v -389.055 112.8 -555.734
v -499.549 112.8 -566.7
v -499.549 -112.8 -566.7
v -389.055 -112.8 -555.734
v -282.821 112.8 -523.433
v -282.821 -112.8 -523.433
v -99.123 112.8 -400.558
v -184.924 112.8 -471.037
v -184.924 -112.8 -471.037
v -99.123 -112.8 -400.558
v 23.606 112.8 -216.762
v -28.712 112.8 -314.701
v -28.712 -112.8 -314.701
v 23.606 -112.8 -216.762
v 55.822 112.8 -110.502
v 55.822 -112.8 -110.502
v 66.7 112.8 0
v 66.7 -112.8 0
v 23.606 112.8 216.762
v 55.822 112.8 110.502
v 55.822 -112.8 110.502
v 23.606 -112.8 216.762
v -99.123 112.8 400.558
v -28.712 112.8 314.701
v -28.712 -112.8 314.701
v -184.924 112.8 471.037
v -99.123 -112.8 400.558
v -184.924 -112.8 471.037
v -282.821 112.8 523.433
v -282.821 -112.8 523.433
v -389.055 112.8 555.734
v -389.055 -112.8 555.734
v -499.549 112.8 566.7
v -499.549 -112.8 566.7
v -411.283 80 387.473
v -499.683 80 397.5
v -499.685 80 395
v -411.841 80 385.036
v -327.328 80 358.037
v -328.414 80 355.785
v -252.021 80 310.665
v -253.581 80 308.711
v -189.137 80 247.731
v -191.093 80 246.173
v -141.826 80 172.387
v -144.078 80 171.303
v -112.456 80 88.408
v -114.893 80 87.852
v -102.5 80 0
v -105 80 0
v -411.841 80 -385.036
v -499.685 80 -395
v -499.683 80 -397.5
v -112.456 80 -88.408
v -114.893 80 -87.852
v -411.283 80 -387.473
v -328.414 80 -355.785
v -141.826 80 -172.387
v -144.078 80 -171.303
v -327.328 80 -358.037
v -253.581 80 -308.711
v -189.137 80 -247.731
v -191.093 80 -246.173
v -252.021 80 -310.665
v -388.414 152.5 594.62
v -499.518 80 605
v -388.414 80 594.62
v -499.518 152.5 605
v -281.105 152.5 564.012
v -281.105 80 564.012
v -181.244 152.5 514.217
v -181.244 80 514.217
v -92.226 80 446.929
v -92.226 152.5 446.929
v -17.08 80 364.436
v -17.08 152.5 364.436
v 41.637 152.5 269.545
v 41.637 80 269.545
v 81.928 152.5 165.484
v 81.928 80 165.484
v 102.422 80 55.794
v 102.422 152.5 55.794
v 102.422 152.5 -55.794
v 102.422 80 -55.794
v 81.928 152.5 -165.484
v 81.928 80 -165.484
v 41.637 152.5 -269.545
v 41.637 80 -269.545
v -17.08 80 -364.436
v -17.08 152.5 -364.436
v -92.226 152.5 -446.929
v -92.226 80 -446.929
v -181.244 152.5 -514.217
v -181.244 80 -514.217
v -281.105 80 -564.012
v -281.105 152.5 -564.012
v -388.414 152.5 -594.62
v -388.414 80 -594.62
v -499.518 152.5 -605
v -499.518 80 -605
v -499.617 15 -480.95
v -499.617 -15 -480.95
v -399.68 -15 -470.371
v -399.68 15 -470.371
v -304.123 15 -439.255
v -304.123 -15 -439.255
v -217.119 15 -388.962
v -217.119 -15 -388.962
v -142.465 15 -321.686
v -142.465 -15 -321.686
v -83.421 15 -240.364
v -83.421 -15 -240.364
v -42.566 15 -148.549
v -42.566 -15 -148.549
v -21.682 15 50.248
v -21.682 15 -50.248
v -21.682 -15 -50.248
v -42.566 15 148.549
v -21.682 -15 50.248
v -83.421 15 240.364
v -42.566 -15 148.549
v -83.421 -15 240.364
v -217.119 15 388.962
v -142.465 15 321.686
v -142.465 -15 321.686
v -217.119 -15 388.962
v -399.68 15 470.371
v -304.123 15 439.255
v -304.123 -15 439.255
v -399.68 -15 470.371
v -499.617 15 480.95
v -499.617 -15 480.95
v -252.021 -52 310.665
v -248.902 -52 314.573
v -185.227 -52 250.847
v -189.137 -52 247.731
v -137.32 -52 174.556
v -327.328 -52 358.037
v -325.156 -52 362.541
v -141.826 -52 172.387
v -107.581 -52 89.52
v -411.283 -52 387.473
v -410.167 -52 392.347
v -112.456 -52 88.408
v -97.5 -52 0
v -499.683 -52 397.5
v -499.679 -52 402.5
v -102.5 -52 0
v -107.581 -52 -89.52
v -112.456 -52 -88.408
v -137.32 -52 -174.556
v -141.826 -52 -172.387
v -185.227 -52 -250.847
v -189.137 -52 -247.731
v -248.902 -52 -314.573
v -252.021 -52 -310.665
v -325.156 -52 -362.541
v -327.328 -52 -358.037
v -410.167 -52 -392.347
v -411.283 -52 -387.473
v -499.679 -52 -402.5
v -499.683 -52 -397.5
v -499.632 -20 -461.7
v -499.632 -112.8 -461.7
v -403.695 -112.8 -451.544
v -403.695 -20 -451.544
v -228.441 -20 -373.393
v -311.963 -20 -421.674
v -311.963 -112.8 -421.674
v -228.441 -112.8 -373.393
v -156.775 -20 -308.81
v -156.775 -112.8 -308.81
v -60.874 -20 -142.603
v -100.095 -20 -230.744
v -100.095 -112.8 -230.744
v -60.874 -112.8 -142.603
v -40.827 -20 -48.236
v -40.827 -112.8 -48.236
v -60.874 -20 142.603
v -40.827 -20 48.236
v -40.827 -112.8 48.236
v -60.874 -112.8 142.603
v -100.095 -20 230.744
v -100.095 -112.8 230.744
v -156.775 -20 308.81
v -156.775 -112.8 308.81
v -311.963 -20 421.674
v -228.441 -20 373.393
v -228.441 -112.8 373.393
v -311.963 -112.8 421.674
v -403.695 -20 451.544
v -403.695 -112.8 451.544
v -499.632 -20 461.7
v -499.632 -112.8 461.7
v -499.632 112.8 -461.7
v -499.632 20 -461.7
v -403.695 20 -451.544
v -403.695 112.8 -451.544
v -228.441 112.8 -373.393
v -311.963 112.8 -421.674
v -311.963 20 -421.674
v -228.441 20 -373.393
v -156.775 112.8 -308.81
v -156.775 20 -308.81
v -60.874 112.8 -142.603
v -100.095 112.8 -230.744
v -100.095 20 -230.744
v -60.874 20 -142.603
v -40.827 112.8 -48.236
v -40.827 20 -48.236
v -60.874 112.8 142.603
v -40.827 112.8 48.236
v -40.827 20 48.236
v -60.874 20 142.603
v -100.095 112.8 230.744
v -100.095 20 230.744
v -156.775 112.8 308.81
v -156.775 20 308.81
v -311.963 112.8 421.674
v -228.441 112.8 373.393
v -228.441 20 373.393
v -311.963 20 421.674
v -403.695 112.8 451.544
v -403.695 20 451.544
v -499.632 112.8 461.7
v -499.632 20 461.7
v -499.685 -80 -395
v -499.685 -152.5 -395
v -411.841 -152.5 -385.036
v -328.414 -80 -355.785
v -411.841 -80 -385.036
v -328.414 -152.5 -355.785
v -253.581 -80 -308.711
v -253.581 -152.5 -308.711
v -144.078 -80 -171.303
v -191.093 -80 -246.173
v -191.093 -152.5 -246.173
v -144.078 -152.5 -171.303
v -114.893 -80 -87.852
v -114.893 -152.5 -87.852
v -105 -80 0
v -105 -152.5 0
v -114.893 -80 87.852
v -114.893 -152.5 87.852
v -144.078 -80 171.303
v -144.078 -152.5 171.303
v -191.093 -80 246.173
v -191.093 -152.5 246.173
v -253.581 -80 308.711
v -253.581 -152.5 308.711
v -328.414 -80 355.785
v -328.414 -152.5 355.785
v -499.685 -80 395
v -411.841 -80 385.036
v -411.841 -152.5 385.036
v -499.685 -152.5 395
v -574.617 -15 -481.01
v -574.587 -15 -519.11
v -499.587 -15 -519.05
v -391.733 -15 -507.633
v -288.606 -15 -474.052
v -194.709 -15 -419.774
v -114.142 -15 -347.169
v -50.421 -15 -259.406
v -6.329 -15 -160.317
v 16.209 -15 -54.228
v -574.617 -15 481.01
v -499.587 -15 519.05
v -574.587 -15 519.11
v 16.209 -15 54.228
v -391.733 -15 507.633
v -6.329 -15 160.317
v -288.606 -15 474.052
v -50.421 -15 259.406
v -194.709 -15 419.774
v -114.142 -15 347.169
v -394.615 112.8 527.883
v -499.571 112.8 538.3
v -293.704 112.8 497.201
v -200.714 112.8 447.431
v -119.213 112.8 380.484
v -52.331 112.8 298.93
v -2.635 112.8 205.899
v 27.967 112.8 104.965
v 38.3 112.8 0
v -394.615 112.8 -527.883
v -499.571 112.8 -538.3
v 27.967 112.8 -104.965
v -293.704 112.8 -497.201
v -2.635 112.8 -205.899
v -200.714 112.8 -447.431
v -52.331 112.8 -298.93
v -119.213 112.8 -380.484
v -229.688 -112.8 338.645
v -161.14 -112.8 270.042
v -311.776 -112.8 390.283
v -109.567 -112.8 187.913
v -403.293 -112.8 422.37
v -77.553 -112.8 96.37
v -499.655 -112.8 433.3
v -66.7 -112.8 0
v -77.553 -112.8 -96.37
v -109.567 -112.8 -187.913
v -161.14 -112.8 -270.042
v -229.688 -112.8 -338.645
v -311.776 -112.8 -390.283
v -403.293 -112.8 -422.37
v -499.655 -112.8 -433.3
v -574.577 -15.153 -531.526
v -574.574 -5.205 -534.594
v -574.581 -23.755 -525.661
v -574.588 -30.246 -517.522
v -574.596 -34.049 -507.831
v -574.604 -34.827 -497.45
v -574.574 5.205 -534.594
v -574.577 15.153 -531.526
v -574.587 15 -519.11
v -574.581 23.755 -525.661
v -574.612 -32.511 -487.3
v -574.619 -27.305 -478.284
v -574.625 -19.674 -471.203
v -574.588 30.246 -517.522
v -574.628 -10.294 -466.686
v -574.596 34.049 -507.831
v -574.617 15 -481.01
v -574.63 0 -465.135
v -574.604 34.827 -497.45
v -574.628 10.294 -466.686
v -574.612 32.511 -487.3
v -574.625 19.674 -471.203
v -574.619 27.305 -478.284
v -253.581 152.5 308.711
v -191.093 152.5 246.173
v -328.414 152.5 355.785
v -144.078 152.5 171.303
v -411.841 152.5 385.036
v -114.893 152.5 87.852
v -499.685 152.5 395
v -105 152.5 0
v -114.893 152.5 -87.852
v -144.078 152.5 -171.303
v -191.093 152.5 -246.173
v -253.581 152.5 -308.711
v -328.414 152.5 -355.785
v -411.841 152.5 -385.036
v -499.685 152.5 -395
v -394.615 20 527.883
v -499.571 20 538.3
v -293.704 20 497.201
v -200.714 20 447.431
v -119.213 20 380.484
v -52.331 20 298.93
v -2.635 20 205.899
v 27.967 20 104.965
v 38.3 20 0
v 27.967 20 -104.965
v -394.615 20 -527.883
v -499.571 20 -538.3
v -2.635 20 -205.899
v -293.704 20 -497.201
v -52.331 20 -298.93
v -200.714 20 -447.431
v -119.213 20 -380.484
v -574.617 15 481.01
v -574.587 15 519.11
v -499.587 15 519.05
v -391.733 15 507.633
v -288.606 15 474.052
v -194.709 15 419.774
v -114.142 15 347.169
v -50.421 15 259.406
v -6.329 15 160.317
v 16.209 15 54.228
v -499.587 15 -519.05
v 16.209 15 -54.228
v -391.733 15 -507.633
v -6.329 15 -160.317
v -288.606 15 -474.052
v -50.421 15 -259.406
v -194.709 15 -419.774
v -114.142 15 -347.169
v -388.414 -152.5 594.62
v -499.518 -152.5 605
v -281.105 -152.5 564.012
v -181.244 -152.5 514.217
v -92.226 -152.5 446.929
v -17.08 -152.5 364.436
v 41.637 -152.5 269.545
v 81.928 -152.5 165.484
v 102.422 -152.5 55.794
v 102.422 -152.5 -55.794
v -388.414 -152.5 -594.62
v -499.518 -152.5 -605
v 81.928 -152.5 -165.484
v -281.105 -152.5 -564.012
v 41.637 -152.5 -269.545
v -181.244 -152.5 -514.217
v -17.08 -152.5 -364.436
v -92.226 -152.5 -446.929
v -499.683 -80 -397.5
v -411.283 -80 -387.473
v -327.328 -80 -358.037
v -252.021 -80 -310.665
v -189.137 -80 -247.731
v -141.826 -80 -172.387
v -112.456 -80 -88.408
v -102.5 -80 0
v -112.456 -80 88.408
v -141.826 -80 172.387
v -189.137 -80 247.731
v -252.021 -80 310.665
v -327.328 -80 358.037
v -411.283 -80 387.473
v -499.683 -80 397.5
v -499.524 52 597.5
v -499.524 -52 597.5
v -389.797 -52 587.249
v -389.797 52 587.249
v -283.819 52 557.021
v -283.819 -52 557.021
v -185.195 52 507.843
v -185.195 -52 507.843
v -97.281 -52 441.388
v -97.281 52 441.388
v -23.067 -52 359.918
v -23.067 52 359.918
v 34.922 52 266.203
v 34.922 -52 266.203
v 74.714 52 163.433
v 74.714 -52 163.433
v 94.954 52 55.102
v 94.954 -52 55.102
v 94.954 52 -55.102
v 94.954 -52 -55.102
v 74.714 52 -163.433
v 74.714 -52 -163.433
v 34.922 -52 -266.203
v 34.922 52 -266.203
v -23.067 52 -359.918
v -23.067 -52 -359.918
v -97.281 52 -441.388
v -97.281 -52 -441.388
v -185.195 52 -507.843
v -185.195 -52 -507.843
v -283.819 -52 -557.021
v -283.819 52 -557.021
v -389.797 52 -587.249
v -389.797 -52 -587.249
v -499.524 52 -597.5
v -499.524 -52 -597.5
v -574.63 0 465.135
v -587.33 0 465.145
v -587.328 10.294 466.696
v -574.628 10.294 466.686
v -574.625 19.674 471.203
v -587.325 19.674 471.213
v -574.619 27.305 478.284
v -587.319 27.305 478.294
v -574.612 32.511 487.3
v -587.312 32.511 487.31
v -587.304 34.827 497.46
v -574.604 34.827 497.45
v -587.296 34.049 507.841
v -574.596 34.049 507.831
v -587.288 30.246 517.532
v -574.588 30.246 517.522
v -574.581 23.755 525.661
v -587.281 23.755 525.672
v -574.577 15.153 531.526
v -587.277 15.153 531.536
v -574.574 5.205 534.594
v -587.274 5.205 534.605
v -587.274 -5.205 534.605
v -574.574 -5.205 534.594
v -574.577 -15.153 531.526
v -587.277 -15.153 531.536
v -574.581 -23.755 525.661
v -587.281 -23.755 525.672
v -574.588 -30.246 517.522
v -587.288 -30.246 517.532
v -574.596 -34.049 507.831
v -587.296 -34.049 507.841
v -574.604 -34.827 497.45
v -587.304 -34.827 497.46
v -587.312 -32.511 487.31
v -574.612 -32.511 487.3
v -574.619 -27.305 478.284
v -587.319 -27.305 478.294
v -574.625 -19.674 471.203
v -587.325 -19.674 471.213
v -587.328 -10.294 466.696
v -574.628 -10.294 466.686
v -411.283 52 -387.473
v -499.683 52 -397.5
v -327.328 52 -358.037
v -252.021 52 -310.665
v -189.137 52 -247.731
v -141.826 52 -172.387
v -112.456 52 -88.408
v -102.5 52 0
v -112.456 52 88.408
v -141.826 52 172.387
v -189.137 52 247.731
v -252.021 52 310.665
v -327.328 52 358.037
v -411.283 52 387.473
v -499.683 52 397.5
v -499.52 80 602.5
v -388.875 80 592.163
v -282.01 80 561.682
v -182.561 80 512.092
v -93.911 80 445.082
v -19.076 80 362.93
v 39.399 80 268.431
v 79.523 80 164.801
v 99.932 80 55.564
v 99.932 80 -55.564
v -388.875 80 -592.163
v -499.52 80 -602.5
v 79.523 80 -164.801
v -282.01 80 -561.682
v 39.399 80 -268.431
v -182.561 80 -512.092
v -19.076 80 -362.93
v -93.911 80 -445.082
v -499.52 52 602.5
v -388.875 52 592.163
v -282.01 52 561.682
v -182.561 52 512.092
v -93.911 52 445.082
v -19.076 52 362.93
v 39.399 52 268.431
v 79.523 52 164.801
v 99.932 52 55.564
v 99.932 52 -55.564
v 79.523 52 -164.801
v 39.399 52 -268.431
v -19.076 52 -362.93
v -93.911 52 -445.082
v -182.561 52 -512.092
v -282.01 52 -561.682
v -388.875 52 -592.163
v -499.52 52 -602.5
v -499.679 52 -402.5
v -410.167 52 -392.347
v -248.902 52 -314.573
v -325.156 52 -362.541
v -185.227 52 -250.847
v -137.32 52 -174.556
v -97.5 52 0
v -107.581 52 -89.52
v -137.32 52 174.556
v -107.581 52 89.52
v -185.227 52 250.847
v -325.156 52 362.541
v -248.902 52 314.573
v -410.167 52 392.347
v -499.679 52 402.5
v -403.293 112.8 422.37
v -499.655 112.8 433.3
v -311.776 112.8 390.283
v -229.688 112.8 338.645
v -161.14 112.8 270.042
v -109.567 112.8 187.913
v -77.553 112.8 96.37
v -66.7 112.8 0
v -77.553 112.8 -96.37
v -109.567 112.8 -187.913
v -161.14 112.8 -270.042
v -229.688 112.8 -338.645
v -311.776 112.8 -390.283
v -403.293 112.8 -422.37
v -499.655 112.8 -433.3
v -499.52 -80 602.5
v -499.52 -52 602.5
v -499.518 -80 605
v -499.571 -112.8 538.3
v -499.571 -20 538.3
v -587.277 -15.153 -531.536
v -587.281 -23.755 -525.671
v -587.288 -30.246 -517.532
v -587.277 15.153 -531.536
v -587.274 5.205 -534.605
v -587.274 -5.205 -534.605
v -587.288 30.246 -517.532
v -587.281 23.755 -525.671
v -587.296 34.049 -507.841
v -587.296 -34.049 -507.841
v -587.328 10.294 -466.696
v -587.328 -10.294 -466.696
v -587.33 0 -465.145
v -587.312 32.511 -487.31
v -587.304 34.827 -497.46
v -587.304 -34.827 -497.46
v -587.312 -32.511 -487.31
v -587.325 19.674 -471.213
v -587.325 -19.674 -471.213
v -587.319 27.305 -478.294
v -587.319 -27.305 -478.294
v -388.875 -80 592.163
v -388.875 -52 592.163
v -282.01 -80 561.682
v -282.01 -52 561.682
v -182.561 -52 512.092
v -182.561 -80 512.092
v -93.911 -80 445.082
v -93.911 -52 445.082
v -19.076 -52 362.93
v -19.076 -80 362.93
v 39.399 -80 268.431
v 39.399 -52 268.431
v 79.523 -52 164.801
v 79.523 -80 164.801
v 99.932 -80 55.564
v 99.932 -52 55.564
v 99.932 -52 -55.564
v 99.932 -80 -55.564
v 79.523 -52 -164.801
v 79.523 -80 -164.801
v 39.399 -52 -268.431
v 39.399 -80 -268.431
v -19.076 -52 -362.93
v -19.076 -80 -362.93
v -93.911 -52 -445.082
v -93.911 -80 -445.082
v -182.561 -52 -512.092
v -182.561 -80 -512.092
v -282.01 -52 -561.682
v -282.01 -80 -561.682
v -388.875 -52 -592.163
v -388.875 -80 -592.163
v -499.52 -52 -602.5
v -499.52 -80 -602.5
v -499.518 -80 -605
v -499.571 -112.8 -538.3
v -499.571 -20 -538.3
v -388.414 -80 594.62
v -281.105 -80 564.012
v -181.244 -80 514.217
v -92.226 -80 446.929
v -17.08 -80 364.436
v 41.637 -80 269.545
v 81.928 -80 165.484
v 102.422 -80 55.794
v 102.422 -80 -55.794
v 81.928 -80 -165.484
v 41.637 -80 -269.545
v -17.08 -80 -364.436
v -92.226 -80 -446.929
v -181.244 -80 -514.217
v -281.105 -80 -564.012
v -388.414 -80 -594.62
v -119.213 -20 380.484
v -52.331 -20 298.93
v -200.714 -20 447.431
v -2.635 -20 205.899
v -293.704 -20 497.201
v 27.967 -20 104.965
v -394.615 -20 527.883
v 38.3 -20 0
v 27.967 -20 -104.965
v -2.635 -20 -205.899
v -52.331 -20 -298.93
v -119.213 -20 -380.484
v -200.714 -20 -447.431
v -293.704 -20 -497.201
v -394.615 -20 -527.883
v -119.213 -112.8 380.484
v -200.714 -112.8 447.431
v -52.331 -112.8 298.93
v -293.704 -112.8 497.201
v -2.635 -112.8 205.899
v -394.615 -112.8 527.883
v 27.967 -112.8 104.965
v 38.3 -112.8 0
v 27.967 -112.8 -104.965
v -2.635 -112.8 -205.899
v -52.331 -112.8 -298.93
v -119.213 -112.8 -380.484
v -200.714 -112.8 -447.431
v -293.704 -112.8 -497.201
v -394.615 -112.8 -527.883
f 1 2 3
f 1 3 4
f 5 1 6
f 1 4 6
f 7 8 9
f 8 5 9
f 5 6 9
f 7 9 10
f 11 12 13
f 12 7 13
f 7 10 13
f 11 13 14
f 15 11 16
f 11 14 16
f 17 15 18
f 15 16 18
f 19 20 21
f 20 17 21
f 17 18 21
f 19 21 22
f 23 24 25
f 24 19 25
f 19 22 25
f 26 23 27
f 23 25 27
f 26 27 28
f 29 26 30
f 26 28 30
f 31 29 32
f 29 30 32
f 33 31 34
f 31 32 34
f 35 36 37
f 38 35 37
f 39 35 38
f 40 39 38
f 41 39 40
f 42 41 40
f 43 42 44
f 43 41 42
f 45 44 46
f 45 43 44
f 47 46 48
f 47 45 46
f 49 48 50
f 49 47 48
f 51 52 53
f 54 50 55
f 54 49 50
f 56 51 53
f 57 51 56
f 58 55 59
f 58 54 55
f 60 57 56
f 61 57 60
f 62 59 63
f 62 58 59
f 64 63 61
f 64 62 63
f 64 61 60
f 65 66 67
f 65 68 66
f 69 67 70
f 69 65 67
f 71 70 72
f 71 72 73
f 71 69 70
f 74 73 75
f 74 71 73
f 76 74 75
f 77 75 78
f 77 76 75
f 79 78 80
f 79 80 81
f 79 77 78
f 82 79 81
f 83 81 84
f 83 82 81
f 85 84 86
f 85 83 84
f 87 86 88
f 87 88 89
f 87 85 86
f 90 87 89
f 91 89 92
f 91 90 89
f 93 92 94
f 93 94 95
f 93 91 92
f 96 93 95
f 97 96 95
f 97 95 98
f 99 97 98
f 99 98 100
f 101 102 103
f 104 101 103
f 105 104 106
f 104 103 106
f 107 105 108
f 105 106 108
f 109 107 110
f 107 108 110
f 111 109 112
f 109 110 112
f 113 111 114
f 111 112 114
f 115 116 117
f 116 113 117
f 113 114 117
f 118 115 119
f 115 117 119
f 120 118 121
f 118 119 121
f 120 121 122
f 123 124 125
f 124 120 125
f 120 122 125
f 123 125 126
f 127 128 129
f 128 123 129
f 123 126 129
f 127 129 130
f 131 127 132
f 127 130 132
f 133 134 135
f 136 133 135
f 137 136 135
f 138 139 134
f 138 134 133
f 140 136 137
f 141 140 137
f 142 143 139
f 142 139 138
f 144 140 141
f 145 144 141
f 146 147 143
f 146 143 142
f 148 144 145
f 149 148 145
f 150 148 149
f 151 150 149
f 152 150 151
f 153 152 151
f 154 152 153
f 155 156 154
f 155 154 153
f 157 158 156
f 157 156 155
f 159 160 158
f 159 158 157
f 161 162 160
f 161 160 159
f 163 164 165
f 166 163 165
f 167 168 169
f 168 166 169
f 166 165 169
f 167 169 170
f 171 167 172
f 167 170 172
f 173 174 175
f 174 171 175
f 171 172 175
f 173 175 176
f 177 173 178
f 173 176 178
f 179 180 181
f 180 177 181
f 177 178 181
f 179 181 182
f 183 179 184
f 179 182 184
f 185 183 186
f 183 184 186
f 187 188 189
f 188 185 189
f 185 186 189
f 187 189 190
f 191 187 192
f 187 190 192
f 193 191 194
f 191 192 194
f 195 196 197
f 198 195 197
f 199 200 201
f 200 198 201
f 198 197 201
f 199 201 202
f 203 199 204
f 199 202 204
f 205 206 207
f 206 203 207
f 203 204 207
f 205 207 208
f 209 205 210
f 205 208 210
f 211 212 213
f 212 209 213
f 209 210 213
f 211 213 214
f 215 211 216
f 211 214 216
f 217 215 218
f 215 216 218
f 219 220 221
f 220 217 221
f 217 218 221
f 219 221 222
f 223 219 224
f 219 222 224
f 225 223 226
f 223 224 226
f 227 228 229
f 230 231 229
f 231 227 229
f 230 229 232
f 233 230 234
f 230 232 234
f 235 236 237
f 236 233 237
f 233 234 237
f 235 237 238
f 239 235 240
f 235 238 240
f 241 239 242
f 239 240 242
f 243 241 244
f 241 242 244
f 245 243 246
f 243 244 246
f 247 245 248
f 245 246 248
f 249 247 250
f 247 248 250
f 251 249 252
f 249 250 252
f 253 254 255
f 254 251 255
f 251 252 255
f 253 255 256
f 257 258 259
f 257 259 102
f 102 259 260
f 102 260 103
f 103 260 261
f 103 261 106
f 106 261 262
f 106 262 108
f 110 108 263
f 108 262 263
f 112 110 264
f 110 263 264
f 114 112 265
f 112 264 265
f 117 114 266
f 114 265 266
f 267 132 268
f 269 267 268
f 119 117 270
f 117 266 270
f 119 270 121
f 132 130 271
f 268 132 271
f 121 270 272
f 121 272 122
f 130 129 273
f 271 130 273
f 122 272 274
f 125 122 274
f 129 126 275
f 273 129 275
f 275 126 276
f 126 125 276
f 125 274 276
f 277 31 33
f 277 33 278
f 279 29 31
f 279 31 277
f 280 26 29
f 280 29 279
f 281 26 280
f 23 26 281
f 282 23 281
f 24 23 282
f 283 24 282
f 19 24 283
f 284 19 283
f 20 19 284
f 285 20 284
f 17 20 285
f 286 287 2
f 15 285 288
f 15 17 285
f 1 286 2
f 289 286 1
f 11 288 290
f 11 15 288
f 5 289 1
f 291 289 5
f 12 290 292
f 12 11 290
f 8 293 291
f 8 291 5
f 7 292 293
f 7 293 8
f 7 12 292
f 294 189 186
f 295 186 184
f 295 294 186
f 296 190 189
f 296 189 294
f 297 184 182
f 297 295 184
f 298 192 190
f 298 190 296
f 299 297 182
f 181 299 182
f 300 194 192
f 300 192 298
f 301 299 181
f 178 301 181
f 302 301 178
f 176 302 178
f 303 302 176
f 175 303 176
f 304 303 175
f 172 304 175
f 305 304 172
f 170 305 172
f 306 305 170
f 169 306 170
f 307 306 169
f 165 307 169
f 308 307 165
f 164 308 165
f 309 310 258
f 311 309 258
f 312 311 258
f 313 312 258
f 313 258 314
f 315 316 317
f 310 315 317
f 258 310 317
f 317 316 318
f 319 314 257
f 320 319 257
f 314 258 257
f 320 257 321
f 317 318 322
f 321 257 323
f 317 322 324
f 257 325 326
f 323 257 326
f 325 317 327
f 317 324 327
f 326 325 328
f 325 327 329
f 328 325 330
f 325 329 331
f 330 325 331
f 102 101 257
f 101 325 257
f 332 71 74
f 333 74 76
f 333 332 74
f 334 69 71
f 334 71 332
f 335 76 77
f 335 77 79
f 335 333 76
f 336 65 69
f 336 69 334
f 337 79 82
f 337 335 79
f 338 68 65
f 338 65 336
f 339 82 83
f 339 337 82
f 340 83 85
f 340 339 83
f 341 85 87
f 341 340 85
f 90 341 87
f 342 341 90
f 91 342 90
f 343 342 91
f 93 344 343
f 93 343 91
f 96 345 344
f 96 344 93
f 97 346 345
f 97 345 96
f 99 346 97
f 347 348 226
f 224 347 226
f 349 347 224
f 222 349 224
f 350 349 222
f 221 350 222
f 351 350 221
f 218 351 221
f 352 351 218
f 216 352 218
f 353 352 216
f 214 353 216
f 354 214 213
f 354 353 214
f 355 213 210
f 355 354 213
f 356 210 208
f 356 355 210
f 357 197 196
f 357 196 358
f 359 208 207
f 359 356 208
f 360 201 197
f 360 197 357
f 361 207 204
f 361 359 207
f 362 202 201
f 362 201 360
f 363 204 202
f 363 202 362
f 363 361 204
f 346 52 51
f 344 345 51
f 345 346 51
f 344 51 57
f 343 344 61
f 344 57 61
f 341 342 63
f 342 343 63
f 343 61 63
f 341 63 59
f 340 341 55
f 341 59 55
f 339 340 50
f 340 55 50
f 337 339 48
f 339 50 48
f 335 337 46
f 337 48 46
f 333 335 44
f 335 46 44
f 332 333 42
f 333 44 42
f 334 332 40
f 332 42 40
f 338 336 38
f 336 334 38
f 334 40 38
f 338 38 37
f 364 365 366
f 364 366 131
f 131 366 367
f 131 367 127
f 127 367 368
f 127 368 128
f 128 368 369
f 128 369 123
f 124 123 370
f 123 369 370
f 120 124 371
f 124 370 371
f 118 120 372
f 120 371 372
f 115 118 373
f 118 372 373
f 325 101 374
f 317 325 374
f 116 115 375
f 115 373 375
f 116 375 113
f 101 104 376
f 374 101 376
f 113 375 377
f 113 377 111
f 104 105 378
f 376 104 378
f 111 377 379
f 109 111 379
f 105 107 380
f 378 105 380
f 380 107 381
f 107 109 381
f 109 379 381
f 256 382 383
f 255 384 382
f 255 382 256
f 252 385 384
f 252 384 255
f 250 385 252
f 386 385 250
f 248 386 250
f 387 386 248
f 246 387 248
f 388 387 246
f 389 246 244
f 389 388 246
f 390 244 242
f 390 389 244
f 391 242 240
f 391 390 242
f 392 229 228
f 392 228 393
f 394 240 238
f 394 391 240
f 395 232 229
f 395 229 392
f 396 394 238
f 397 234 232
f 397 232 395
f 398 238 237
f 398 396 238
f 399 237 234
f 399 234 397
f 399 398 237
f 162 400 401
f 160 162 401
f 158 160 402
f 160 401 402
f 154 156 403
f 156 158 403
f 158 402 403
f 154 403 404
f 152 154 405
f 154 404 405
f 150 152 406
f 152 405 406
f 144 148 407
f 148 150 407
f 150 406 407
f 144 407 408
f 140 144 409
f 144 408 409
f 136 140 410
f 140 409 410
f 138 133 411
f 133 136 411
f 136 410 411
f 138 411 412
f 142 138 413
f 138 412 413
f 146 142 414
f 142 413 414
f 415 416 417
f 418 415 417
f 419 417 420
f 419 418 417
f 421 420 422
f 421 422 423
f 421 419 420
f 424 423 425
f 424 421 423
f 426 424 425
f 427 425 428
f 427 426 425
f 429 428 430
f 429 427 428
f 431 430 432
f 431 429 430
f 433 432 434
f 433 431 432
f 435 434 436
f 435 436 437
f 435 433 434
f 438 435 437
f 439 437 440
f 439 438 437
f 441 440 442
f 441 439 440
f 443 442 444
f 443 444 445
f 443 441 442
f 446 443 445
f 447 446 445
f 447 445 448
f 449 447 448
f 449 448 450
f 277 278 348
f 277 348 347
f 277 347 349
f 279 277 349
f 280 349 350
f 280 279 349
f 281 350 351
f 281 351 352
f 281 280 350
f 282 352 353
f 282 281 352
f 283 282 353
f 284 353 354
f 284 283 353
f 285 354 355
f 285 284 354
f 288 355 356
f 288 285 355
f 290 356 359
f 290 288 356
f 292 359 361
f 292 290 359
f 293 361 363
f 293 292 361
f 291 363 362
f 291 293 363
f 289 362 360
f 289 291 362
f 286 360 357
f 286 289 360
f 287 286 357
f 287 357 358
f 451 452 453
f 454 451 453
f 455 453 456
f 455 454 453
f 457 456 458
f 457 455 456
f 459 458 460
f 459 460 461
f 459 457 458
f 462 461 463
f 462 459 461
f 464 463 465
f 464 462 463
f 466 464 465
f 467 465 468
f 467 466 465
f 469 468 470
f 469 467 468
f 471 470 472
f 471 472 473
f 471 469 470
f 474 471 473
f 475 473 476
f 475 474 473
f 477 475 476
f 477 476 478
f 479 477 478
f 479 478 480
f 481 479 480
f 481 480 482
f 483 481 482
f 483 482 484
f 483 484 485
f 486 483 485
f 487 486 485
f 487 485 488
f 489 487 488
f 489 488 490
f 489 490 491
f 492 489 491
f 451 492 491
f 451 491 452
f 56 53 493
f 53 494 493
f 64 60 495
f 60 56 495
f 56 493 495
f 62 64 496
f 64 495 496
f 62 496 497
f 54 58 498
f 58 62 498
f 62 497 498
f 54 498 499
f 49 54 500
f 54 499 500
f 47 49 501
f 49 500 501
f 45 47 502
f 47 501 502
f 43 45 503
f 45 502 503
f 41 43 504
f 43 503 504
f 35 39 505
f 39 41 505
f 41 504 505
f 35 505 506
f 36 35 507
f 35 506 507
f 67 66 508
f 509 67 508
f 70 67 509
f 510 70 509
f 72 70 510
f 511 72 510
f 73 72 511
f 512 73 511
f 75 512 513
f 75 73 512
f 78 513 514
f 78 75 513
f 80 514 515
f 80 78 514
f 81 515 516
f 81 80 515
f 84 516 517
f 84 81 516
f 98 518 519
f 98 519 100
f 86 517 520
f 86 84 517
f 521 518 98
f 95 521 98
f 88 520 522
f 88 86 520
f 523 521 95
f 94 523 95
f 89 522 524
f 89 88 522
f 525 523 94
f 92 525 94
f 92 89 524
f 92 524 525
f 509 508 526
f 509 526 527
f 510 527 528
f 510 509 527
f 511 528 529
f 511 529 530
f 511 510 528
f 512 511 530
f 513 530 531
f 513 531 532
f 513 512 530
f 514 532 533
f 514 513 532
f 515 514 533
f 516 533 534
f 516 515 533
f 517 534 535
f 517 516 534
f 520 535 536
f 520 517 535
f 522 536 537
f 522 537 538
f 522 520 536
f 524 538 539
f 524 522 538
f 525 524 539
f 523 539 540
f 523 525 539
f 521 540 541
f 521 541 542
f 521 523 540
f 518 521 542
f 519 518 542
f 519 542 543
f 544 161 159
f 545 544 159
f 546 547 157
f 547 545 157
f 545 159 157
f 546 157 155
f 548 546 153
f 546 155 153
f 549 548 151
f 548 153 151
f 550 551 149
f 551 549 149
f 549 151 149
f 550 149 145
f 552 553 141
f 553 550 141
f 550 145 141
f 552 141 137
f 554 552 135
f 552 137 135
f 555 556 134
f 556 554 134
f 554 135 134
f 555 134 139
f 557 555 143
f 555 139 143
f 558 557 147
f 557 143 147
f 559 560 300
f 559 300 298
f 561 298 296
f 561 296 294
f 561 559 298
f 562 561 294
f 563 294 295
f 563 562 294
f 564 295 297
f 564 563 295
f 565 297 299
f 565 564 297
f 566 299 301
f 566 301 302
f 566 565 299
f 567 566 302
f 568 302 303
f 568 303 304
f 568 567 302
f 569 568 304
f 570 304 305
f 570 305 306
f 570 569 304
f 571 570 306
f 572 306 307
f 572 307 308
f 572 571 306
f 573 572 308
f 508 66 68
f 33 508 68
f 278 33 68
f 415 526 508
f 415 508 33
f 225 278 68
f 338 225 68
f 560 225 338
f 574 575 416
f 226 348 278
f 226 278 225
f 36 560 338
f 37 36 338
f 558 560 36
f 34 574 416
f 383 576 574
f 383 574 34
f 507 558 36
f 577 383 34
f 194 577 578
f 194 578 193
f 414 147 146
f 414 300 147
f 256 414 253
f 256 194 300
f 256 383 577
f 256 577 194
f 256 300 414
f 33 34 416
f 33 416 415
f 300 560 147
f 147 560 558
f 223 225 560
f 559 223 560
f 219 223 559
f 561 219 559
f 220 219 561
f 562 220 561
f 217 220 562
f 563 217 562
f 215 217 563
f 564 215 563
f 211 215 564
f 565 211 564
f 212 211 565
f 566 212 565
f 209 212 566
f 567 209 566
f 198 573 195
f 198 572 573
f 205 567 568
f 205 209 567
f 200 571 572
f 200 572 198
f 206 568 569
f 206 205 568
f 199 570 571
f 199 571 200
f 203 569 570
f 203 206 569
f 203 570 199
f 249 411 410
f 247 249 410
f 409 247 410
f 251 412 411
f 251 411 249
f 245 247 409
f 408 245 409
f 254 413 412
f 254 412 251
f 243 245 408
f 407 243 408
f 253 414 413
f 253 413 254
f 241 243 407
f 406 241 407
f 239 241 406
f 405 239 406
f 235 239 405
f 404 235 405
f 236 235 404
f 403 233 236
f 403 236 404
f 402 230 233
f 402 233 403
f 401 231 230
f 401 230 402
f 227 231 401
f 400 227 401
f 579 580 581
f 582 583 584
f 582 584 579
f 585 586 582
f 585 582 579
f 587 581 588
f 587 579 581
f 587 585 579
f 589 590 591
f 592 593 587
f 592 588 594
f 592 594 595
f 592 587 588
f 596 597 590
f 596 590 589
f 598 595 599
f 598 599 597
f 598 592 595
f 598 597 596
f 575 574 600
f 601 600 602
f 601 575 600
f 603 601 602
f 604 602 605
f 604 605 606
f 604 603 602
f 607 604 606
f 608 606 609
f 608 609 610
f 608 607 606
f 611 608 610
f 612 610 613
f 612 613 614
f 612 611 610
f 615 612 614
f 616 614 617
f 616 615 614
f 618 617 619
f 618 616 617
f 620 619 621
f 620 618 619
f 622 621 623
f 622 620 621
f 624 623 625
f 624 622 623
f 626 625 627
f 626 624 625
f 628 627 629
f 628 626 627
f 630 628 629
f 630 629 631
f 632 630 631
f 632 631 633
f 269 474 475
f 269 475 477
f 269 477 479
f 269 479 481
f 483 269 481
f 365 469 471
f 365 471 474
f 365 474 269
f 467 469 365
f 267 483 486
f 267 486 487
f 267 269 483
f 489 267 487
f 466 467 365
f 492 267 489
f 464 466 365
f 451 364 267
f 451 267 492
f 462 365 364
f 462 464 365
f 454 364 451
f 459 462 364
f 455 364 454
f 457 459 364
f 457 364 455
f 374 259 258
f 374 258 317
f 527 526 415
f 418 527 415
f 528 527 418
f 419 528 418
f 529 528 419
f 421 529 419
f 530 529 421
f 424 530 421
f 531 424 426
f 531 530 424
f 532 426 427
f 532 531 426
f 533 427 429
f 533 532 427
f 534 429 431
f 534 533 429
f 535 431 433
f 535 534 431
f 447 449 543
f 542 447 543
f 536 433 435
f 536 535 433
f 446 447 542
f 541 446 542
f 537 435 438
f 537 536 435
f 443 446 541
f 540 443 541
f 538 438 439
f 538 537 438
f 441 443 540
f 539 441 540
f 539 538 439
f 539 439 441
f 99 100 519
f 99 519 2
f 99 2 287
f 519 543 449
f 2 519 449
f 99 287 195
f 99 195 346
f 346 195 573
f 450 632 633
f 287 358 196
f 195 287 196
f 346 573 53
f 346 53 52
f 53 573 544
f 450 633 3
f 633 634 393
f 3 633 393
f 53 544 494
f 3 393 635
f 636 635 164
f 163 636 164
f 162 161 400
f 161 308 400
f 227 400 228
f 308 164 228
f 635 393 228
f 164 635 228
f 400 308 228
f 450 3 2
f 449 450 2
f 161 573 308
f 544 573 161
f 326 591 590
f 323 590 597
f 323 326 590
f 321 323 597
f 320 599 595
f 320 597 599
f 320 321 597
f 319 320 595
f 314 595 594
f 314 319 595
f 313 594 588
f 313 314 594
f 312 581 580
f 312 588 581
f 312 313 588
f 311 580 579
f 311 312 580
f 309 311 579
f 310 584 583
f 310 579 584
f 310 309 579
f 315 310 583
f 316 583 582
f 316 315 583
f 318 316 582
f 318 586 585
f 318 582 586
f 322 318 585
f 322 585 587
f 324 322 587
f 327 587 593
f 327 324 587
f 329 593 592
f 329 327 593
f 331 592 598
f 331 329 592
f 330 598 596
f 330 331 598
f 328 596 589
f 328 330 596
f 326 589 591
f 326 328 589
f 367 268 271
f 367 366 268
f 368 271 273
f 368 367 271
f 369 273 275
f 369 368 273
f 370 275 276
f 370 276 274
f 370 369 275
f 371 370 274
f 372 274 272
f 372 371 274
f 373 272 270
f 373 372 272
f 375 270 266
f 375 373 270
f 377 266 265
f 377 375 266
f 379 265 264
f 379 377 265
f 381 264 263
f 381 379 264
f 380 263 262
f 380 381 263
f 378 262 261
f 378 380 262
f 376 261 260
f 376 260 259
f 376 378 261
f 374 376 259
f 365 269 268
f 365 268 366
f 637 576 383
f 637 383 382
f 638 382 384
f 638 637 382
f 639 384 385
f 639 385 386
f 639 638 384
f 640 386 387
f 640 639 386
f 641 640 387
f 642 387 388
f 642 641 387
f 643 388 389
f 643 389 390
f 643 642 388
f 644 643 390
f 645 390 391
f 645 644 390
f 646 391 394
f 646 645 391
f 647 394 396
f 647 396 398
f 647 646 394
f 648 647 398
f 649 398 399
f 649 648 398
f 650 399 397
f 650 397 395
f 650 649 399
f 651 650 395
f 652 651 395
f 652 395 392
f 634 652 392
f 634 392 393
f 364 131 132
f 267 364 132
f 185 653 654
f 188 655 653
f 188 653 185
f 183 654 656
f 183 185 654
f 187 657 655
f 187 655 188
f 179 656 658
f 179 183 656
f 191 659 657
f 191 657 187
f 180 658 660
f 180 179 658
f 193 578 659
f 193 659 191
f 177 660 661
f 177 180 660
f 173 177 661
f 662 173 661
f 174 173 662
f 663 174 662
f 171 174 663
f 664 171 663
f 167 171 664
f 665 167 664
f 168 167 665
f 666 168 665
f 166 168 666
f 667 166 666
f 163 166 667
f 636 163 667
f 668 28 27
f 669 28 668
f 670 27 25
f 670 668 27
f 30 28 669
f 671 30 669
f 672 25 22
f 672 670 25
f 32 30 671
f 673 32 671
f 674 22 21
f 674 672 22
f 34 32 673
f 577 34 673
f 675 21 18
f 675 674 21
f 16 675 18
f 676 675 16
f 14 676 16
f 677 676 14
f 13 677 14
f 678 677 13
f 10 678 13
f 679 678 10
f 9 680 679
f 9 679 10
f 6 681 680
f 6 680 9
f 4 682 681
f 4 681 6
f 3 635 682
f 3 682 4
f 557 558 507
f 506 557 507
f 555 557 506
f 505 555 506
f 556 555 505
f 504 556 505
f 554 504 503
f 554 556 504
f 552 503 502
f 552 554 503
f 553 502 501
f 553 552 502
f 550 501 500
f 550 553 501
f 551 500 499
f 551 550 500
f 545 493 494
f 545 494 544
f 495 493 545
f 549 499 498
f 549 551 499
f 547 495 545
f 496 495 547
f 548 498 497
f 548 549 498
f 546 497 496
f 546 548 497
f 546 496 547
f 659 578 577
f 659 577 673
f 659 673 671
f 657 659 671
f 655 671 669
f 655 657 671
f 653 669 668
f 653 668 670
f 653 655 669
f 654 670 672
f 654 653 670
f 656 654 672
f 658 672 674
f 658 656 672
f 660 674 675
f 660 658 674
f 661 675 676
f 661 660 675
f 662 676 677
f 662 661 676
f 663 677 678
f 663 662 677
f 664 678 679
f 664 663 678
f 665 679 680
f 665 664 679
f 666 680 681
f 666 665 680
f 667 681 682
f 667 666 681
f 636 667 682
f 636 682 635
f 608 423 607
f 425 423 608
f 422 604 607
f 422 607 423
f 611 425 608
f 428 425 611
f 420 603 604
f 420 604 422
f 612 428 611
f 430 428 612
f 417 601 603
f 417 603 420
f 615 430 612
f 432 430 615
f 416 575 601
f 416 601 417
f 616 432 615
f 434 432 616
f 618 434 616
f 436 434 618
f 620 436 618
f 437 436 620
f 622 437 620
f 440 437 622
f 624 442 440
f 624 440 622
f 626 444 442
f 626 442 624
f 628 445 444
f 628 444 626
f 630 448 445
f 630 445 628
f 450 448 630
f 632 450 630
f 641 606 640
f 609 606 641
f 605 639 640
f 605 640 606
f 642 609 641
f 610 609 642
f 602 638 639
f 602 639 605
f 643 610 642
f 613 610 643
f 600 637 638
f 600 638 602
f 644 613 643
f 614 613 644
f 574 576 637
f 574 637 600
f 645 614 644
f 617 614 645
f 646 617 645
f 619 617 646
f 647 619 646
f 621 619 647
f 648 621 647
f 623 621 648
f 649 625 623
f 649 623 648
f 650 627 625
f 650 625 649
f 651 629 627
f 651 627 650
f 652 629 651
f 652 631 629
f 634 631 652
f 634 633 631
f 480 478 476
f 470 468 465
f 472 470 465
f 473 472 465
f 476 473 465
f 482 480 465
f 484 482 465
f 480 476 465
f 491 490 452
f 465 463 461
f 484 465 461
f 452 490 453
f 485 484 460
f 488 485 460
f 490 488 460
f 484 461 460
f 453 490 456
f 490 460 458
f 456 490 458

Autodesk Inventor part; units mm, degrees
ref_plane "YZ Plane" through (0, 0, 0) normal (1, 0, 0) x (0, 1, 0)
ref_plane "XY Plane" through (0, 0, 0) normal (0, 0, 1) x (1, 0, 0)
sketch "Sketch1" plane through (0, 0, 0) normal (0, 0, 1) x (0, 1, 0)
  line L0 (-152.5, -105) -> (152.5, -105)
  line L1 (152.5, -105) -> (152.5, 105)
  line L2 (152.5, 105) -> (-152.5, 105)
  line L3 (-152.5, 105) -> (-152.5, -105)
  line L4 (-152.5, -105) -> (152.5, 105) construction
  line L5 (152.5, -105) -> (-152.5, 105) construction
  line L6 (112.8, 66.7) -> (-112.8, 66.7)
  line L7 (-112.8, 66.7) -> (-112.8, 38.3)
  line L8 (-112.8, 38.3) -> (-20, 38.3)
  line L9 (-20, 38.3) -> (-20, -38.3)
  line L10 (-20, -38.3) -> (-112.8, -38.3)
  line L11 (-112.8, -38.3) -> (-112.8, -66.7)
  line L12 (-112.8, -66.7) -> (112.8, -66.7)
  line L13 (112.8, -66.7) -> (112.8, -38.3)
  line L14 (112.8, -38.3) -> (20, -38.3)
  line L15 (20, -38.3) -> (20, 38.3)
  line L16 (20, 38.3) -> (112.8, 38.3)
  line L17 (112.8, 38.3) -> (112.8, 66.7)
  line L18 (-80, 105) -> (80, 105)
  line L19 (80, 105) -> (80, 102.5)
  line L20 (80, 102.5) -> (-80, 102.5)
  line L21 (-80, 102.5) -> (-80, 105)
  line L22 (-52, 102.5) -> (52, 102.5)
  line L23 (52, 102.5) -> (52, 97.5)
  line L24 (52, 97.5) -> (-52, 97.5)
  line L25 (-52, 97.5) -> (-52, 102.5)
  line L26 (-80, -102.5) -> (80, -102.5)
  line L27 (80, -102.5) -> (80, -105)
  line L28 (80, -105) -> (-80, -105)
  line L29 (-80, -105) -> (-80, -102.5)
  line L30 (-52, -97.5) -> (52, -97.5)
  line L31 (52, -97.5) -> (52, -102.5)
  line L32 (52, -102.5) -> (-52, -102.5)
  line L33 (-52, -102.5) -> (-52, -97.5)
  point P0 (0, 0)
  point P1 (20, 0)
  point P2 (-20, 0)
  point P3 (0, 0)
  point P4 (0, 66.7)
  point P5 (0, 0)
  point P6 (0, -66.7)
  point P7 (0, 102.5)
  point P8 (0, 105)
  point P9 (0, -102.5)
  point P10 (0, -105)
  dimension "d6" = 305
  dimension "d7" = 210
  dimension "d8" = 225.6
  dimension "d9" = 28.4
  dimension "d10" = 40
  dimension "d11" = 76.6
  dimension "d12" = 38.3
  dimension "d46" = 2.5
  dimension "d47" = 5
  dimension "d48" = 104
  dimension "d49" = 160
sketch "Sketch2" plane through (0, 0, 0) normal (0, 1, 0) x (-1, 0, 0)
  line L0 (0, -700) -> (0, 700) projected
  arc A0 (499.6018, 499.9998) -> (499.6018, -499.9998) centre (500, 0) ccw
  line L1 (500, 0) -> (0, 0) construction
  line L2 (499.6018, 499.9998) -> (500, 0) construction
  line L3 (499.6018, -499.9998) -> (500, 0) construction
  dimension "d54" = 90
  dimension "d58" = 1570
  dimension "d59" = 179.909
sweep "Sweep1" add profiles "Sketch1" path "Sketch2" path curves A0 contours L3 L2 L21 L20 L25 L24 L23 L19 L1 L0 L27 L26 L31 L30 L33 L29
sketch "Sketch3" plane through (0, 0, 0) normal (0, 0, 1) x (0, 1, 0)
  line L0 (20, 38.3) -> (112.8, 38.3) projected
  line L1 (112.8, 38.3) -> (112.8, 66.7) projected
  line L2 (112.8, 66.7) -> (-112.8, 66.7) projected
  line L3 (-112.8, 66.7) -> (-112.8, 38.3) projected
  line L4 (-112.8, 38.3) -> (-20, 38.3) projected
  line L5 (-20, 38.3) -> (-20, -38.3) projected
  line L6 (-20, -38.3) -> (-112.8, -38.3) projected
  line L7 (-112.8, -38.3) -> (-112.8, -66.7) projected
  line L8 (-112.8, -66.7) -> (112.8, -66.7) projected
  line L9 (112.8, -66.7) -> (112.8, -38.3) projected
  line L10 (112.8, -38.3) -> (20, -38.3) projected
  line L11 (20, -38.3) -> (20, 38.3) projected
  line L12 (80, 102.5) -> (80, 105) projected
  line L13 (80, 105) -> (152.5, 105) projected
  line L14 (152.5, 105) -> (152.5, -105) projected
  line L15 (152.5, -105) -> (80, -105) projected
  line L16 (80, -105) -> (80, -102.5) projected
  line L17 (80, -102.5) -> (52, -102.5) projected
  line L18 (52, -102.5) -> (52, -97.5) projected
  line L19 (52, -97.5) -> (-52, -97.5) projected
  line L20 (-52, -97.5) -> (-52, -102.5) projected
  line L21 (-52, -102.5) -> (-80, -102.5) projected
  line L22 (-80, -102.5) -> (-80, -105) projected
  line L23 (-80, -105) -> (-152.5, -105) projected
  line L24 (-152.5, -105) -> (-152.5, 105) projected
  line L25 (-152.5, 105) -> (-80, 105) projected
  line L26 (-80, 105) -> (-80, 102.5) projected
  line L27 (-80, 102.5) -> (-52, 102.5) projected
  line L28 (-52, 102.5) -> (-52, 97.5) projected
  line L29 (-52, 97.5) -> (52, 97.5) projected
  line L30 (52, 97.5) -> (52, 102.5) projected
  line L31 (52, 102.5) -> (80, 102.5) projected
  line L32 (23.9, 65.45) -> (108.9, 65.45)
  line L33 (108.9, 65.45) -> (108.9, 39.55)
  line L34 (108.9, 39.55) -> (23.9, 39.55)
  line L35 (23.9, 39.55) -> (23.9, 65.45)
  line L36 (23.9, 65.45) -> (108.9, 39.55) construction
  line L37 (108.9, 65.45) -> (23.9, 39.55) construction
  line L38 (0, 226) -> (0, -621) projected
  line L39 (-23.9, 65.45) -> (-108.9, 65.45)
  line L40 (-108.9, 65.45) -> (-108.9, 39.55)
  line L41 (-108.9, 39.55) -> (-23.9, 39.55)
  line L42 (-23.9, 39.55) -> (-23.9, 65.45)
  point P0 (112.8, -500)
  point P1 (66.4, 52.5)
  point P2 (66.4, 52.5)
  point P3 (66.4, 38.3)
  point P4 (108.9, 52.5)
  point P5 (112.8, 52.5)
  dimension "d60" = 85
  dimension "d61" = 25.9
ref_plane "Work Plane2" through (-52.5, 66.4, 0) normal (0, 1, 0) x (-1, 0, 0)
sketch "Sketch10" plane through (-52.5, 66.4, 0) normal (0, 1, 0) x (-1, 0, 0)
  arc A0 (447.155, 433.2999) -> (447.155, -433.2999) centre (447.5, 0) ccw projected
  arc A1 (447.0487, 566.6998) -> (447.0487, -566.6998) centre (447.5, 0) ccw projected
  arc A2 (447.155, 433.2999) -> (447.0487, 566.6998) centre (447.1018, 499.9998) ccw
  arc A3 (447.0487, -566.6998) -> (447.155, -433.2999) centre (447.1018, -499.9998) ccw
  point P0 (-52.5, 0)
sweep "Sweep5" [suppressed]
sketch "Sketch5" plane through (0, 0, 0) normal (0, 0, 1) x (0, 1, 0)
  line L0 (-15, 19.05) -> (15, 19.05)
  line L1 (15, 19.05) -> (15, -19.05)
  line L2 (15, -19.05) -> (-15, -19.05)
  line L3 (-15, -19.05) -> (-15, 19.05)
  line L4 (-15, 19.05) -> (15, -19.05) construction
  line L5 (15, 19.05) -> (-15, -19.05) construction
  point P0 (0, 0)
  dimension "d27" = 30
  dimension "d28" = 38.1
sketch "Sketch6" plane through (0, 0, 0) normal (0, 1, 0) x (-1, 0, 0)
  arc A0 (499.6018, 499.9998) -> (499.6018, -499.9998) centre (500, 0) ccw projected
  line L0 (499.6018, 499.9998) -> (574.6018, 500.0596)
  line L1 (499.6018, -499.9998) -> (574.6018, -500.0596)
  dimension "d64" = 75
  dimension "d65" = 75
sweep "Sweep4" add profiles "Sketch5" path "Sketch6"
sketch "Sketch7" plane through (-574.3679, -15, 793.7782) normal (0.9999997, 0, -0.0007963) x (-0.0007963, 0, -0.9999997)
  circle A0 centre (293.7187, 15) radius 34.925
  line L0 (274.6687, 0) -> (274.6687, 30) projected
  line L1 (274.6687, 30) -> (312.7687, 30) projected
  line L2 (312.7687, 30) -> (312.7687, 0) projected
  line L3 (312.7687, 0) -> (274.6687, 0) projected
  point P0 (293.7187, 30)
  point P1 (312.7687, 15)
  dimension "d32" = 69.85
extrude "Extrusion1" add sketch "Sketch7" against normal blind 12.7 contours A0 | L0 L1 L2 L3
sketch "Sketch9" plane through (-574.7964, -15, -255.7535) normal (-0.9999997, 0, -0.0007963) x (-0.0007963, 0, 0.9999997)
  circle A0 centre (-244.3061, 15) radius 34.925
  line L0 (-263.3561, 0) -> (-225.2561, 0) projected
  line L1 (-263.3561, 30) -> (-263.3561, 0) projected
  line L2 (-225.2561, 30) -> (-263.3561, 30) projected
  line L3 (-225.2561, 0) -> (-225.2561, 30) projected
  point P0 (-244.3061, 30)
  point P1 (-263.3561, 15)
  dimension "d40" = 69.85
extrude "Extrusion3" add sketch "Sketch9" along normal blind 12.7 contours A0 | L1 L2 L3 L0
equation "\"d58\" = Length"
equation "\"d59\" = Angle"
equation "\"d65\" = d64"
equation "\"d40\" = d32"
equation "\"d41\" = d33"
equation "\"Angle\" = 179.909deg"
equation "\"Length\" = 1570"
equation "\"d33\" = 12.7"
properties part number "Sbend100_0"
